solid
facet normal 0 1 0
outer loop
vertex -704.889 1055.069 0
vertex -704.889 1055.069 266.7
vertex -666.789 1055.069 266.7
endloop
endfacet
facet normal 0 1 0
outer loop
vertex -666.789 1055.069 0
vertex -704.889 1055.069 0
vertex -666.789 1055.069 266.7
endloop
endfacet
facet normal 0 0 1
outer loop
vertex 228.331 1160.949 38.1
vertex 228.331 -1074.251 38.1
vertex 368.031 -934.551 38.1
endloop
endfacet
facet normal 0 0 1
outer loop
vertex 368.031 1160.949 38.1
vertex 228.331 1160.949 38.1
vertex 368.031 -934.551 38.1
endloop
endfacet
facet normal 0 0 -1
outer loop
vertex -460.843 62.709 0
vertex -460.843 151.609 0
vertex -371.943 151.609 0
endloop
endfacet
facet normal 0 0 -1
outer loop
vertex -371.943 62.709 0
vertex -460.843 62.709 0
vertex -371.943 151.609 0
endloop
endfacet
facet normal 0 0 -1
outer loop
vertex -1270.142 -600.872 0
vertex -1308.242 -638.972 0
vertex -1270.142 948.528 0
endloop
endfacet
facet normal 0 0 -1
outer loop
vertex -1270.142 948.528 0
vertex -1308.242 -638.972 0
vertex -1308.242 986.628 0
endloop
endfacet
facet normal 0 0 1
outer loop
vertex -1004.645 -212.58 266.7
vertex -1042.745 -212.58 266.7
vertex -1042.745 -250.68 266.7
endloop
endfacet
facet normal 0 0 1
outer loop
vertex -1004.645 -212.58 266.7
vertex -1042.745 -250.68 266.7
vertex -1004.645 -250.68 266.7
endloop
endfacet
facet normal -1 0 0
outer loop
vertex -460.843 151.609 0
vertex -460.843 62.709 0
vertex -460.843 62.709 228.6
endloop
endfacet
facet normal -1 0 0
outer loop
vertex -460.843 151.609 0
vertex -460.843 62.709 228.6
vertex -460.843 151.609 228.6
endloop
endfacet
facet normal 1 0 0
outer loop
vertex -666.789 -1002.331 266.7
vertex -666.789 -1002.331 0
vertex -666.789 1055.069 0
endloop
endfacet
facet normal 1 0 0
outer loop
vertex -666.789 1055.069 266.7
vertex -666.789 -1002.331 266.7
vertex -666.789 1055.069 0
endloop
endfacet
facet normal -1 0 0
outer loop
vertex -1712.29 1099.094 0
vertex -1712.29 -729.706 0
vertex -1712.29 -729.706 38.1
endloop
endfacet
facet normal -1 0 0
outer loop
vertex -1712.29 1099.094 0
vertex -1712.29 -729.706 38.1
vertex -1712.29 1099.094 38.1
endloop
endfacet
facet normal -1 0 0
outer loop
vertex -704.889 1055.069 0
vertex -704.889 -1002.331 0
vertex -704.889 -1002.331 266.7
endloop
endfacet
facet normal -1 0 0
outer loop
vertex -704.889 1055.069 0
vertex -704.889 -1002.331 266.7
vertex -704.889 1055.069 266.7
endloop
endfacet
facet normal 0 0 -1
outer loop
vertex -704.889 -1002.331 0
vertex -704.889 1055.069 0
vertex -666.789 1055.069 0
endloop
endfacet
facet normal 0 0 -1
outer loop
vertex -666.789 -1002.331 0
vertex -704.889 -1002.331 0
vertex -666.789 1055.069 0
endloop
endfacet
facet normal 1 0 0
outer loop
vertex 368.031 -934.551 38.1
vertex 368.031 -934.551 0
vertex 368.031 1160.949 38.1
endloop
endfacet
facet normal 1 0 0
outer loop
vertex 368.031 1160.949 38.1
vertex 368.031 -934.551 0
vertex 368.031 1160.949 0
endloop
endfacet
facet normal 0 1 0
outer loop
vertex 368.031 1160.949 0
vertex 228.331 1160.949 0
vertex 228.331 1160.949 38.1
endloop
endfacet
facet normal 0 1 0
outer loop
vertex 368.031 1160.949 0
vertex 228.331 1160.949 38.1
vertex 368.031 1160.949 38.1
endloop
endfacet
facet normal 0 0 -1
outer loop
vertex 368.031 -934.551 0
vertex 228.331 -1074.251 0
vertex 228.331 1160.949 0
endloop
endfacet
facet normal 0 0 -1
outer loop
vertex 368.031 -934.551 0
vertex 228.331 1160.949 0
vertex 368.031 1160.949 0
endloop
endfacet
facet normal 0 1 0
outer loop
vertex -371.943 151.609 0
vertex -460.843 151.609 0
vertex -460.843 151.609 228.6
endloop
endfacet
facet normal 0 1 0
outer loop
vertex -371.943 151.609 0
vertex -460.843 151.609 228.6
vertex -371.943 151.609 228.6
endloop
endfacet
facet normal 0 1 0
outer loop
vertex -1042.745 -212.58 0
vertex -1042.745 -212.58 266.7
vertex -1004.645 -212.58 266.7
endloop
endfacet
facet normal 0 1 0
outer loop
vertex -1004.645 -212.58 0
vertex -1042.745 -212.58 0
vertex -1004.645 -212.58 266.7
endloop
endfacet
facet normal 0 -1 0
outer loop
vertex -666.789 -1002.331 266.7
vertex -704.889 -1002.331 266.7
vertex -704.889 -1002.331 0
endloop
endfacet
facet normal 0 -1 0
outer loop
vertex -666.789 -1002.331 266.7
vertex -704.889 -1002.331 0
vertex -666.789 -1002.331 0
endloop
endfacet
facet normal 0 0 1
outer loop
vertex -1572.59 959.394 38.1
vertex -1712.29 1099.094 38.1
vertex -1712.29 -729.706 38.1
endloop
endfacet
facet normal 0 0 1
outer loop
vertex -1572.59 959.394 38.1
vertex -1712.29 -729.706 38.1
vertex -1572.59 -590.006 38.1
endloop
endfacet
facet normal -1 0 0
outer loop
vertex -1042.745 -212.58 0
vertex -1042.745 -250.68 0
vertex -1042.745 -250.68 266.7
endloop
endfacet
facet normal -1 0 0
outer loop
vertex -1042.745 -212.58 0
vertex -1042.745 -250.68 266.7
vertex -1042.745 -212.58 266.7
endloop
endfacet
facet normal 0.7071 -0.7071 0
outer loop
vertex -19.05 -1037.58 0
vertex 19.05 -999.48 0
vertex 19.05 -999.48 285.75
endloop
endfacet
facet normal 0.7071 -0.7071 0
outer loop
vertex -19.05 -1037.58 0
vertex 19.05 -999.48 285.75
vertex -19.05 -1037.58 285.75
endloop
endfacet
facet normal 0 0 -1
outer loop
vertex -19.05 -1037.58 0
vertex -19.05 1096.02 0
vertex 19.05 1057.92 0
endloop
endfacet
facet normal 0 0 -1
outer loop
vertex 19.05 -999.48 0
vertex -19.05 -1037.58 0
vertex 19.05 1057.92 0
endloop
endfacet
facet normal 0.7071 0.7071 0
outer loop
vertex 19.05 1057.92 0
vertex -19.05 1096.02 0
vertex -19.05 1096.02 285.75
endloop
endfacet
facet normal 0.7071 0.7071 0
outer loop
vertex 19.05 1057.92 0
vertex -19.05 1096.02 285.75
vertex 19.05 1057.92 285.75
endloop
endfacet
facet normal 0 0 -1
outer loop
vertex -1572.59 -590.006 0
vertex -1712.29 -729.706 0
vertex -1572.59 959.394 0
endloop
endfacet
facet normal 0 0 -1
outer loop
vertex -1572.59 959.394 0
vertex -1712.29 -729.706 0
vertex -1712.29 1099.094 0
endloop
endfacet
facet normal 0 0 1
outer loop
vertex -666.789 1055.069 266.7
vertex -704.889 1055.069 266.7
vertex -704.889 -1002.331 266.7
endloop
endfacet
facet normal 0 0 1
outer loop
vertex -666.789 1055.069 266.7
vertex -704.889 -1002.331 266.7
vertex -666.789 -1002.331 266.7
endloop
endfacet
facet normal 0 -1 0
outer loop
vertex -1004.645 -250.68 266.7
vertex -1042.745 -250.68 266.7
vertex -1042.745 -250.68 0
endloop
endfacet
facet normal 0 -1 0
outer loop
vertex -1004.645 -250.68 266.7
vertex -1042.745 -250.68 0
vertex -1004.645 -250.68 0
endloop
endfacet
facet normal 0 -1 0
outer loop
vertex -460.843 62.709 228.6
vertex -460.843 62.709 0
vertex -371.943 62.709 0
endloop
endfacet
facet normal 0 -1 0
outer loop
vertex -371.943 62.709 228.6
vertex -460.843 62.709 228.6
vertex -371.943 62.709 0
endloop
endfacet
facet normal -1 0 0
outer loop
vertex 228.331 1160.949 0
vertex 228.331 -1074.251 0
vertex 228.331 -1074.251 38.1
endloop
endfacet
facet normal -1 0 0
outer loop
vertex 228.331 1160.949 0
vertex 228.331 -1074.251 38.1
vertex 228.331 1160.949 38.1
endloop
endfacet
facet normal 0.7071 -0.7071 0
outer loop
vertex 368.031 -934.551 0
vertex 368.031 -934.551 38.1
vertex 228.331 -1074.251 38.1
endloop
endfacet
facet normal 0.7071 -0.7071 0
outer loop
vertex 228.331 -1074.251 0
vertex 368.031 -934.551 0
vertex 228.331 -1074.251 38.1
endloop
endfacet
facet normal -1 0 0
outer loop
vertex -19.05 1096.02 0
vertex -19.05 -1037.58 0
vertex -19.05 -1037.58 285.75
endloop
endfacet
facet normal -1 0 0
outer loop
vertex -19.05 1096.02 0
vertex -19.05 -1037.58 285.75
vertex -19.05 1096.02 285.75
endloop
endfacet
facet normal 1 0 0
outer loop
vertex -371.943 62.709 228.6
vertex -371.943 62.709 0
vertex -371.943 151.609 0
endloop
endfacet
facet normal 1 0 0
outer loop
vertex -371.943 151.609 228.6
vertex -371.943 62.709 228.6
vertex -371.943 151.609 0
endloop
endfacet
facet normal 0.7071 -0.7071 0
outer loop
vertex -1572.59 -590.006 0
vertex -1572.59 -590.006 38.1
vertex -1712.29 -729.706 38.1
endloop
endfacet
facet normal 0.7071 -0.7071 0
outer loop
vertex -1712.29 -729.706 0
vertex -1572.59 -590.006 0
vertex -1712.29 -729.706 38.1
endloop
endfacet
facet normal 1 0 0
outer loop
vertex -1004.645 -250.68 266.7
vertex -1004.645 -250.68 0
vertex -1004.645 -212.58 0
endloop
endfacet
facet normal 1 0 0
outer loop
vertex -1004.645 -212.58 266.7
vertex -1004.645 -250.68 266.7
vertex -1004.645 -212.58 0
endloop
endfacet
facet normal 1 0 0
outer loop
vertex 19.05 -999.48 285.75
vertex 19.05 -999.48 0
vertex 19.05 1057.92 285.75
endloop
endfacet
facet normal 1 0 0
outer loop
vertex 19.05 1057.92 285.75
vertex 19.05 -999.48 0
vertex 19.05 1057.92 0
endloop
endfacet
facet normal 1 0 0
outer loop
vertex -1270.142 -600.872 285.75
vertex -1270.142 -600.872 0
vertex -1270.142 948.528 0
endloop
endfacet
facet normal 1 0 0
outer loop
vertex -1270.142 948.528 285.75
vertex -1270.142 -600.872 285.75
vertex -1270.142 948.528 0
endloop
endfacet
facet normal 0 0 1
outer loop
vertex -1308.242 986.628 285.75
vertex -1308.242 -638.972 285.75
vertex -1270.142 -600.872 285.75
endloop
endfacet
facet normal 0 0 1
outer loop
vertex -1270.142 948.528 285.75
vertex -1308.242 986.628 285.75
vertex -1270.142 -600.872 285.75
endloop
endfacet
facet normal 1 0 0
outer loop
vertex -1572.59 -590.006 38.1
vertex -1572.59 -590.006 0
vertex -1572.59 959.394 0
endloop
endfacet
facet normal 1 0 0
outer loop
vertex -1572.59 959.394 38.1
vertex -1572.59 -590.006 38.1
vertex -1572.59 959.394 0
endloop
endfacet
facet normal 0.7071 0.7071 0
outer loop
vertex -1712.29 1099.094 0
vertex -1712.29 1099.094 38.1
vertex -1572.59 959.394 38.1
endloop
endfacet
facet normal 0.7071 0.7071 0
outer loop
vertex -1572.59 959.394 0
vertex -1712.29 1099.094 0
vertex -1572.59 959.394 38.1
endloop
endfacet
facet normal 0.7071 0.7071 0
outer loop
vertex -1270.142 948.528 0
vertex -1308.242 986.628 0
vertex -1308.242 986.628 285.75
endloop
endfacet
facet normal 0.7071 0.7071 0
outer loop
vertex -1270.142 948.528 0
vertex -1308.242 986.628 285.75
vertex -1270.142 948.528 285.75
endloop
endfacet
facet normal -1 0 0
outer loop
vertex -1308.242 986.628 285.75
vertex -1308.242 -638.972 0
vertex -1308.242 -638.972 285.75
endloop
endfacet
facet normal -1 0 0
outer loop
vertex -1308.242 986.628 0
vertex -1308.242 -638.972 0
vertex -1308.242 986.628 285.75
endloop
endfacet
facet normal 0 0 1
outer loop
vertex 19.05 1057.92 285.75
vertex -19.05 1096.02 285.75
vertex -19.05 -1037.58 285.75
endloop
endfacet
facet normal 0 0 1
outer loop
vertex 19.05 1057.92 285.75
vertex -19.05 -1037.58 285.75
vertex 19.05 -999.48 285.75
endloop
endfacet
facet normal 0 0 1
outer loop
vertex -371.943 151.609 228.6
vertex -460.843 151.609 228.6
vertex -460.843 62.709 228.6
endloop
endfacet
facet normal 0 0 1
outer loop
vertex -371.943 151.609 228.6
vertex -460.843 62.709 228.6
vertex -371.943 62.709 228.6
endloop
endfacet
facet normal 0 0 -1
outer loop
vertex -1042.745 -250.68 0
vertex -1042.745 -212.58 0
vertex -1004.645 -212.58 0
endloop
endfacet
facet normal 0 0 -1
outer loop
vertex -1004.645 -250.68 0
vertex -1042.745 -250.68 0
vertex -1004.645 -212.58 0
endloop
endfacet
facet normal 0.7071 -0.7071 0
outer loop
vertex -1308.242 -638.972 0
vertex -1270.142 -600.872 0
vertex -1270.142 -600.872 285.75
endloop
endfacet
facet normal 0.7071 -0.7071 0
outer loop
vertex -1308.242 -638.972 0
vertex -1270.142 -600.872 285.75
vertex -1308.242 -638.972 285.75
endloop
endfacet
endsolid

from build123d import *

# Parameters (mm, degrees)
F0_W      = 38.1
F0_H      = 2133.6
F1_DEPTH  = 285.75
F2_W      = 38.1
F2_H      = 1625.6
F3_DEPTH  = 285.75
F4_W      = 38.1
F4_H      = 2057.4
F5_DEPTH  = 266.7
F6_W      = 38.1
F6_H      = 38.1
F7_DEPTH  = 266.7
F8_W      = 88.9
F8_H      = 88.9
F9_DEPTH  = 228.6
F10_W     = 139.7
F10_H     = 2235.2
F11_DEPTH = 38.1
F12_W     = 139.7
F12_H     = 1828.8
F13_DEPTH = 38.1
F15_DEPTH = 285.751
F17_DEPTH = 285.751
F19_DEPTH = 38.101
F21_DEPTH = 38.101


with BuildPart() as f1:
    # F0 (on Top) → F1 (new body)
    with BuildSketch(Plane.XY):
        with Locations((0, 29.220348)):
            Rectangle(F0_W, F0_H)
    extrude(amount=F1_DEPTH)

    # F14 (on face) → F15 (cut, through all)
    with BuildSketch(Plane.XY.offset(285.75)):
        Polygon((19.05, -999.479652), (-19.05, -1037.579652), (19.05, -1037.579652), align=None)
        Polygon((19.05, 1057.920348), (19.05, 1096.020348), (-19.05, 1096.020348), align=None)
    extrude(amount=-F15_DEPTH, mode=Mode.SUBTRACT)


with BuildPart() as f3:
    # F2 (on Top) → F3 (new body)
    with BuildSketch(Plane.XY):
        with Locations((-1289.192454, 173.827569)):
            Rectangle(F2_W, F2_H)
    extrude(amount=F3_DEPTH)

    # F16 (on face) → F17 (cut, through all)
    with BuildSketch(Plane.XY.offset(285.75)):
        Polygon((-1270.142454, 986.627569), (-1308.242454, 986.627569), (-1270.142454, 948.527569), align=None)
        Polygon((-1308.242454, -638.972431), (-1270.142454, -638.972431), (-1270.142454, -600.872431), align=None)
    extrude(amount=-F17_DEPTH, mode=Mode.SUBTRACT)


with BuildPart() as f5:
    # F4 (on Top) → F5 (new body)
    with BuildSketch(Plane.XY):
        with Locations((-685.839234, 26.368862)):
            Rectangle(F4_W, F4_H)
    extrude(amount=F5_DEPTH)


with BuildPart() as f7:
    # F6 (on Top) → F7 (new body)
    with BuildSketch(Plane.XY):
        with Locations((-1023.695287, -231.63034)):
            Rectangle(F6_W, F6_H)
    extrude(amount=F7_DEPTH)


with BuildPart() as f9:
    # F8 (on Top) → F9 (new body)
    with BuildSketch(Plane.XY):
        with Locations((-416.393369, 107.158791)):
            Rectangle(F8_W, F8_H)
    extrude(amount=F9_DEPTH)


with BuildPart() as f11:
    # F10 (on Top) → F11 (new body)
    with BuildSketch(Plane.XY):
        with Locations((298.18053, 43.349066)):
            Rectangle(F10_W, F10_H)
    extrude(amount=F11_DEPTH)

    # F18 (on face) → F19 (cut, through all)
    with BuildSketch(Plane.XY.offset(38.1)):
        Polygon((368.03053, -934.550934), (228.33053, -1074.250934), (368.03053, -1074.250934), align=None)
    extrude(amount=-F19_DEPTH, mode=Mode.SUBTRACT)


with BuildPart() as f13:
    # F12 (on Top) → F13 (new body)
    with BuildSketch(Plane.XY):
        with Locations((-1642.440043, 184.694294)):
            Rectangle(F12_W, F12_H)
    extrude(amount=F13_DEPTH)

    # F20 (on face) → F21 (cut, through all)
    with BuildSketch(Plane.XY.offset(38.1)):
        Polygon((-1572.590043, 1099.094294), (-1712.290043, 1099.094294), (-1572.590043, 959.394294), align=None)
        Polygon((-1572.590043, -590.005706), (-1712.290043, -729.705706), (-1572.590043, -729.705706), align=None)
    extrude(amount=-F21_DEPTH, mode=Mode.SUBTRACT)


solid = Compound([f1.part, f3.part, f5.part, f7.part, f9.part, f11.part, f13.part])
